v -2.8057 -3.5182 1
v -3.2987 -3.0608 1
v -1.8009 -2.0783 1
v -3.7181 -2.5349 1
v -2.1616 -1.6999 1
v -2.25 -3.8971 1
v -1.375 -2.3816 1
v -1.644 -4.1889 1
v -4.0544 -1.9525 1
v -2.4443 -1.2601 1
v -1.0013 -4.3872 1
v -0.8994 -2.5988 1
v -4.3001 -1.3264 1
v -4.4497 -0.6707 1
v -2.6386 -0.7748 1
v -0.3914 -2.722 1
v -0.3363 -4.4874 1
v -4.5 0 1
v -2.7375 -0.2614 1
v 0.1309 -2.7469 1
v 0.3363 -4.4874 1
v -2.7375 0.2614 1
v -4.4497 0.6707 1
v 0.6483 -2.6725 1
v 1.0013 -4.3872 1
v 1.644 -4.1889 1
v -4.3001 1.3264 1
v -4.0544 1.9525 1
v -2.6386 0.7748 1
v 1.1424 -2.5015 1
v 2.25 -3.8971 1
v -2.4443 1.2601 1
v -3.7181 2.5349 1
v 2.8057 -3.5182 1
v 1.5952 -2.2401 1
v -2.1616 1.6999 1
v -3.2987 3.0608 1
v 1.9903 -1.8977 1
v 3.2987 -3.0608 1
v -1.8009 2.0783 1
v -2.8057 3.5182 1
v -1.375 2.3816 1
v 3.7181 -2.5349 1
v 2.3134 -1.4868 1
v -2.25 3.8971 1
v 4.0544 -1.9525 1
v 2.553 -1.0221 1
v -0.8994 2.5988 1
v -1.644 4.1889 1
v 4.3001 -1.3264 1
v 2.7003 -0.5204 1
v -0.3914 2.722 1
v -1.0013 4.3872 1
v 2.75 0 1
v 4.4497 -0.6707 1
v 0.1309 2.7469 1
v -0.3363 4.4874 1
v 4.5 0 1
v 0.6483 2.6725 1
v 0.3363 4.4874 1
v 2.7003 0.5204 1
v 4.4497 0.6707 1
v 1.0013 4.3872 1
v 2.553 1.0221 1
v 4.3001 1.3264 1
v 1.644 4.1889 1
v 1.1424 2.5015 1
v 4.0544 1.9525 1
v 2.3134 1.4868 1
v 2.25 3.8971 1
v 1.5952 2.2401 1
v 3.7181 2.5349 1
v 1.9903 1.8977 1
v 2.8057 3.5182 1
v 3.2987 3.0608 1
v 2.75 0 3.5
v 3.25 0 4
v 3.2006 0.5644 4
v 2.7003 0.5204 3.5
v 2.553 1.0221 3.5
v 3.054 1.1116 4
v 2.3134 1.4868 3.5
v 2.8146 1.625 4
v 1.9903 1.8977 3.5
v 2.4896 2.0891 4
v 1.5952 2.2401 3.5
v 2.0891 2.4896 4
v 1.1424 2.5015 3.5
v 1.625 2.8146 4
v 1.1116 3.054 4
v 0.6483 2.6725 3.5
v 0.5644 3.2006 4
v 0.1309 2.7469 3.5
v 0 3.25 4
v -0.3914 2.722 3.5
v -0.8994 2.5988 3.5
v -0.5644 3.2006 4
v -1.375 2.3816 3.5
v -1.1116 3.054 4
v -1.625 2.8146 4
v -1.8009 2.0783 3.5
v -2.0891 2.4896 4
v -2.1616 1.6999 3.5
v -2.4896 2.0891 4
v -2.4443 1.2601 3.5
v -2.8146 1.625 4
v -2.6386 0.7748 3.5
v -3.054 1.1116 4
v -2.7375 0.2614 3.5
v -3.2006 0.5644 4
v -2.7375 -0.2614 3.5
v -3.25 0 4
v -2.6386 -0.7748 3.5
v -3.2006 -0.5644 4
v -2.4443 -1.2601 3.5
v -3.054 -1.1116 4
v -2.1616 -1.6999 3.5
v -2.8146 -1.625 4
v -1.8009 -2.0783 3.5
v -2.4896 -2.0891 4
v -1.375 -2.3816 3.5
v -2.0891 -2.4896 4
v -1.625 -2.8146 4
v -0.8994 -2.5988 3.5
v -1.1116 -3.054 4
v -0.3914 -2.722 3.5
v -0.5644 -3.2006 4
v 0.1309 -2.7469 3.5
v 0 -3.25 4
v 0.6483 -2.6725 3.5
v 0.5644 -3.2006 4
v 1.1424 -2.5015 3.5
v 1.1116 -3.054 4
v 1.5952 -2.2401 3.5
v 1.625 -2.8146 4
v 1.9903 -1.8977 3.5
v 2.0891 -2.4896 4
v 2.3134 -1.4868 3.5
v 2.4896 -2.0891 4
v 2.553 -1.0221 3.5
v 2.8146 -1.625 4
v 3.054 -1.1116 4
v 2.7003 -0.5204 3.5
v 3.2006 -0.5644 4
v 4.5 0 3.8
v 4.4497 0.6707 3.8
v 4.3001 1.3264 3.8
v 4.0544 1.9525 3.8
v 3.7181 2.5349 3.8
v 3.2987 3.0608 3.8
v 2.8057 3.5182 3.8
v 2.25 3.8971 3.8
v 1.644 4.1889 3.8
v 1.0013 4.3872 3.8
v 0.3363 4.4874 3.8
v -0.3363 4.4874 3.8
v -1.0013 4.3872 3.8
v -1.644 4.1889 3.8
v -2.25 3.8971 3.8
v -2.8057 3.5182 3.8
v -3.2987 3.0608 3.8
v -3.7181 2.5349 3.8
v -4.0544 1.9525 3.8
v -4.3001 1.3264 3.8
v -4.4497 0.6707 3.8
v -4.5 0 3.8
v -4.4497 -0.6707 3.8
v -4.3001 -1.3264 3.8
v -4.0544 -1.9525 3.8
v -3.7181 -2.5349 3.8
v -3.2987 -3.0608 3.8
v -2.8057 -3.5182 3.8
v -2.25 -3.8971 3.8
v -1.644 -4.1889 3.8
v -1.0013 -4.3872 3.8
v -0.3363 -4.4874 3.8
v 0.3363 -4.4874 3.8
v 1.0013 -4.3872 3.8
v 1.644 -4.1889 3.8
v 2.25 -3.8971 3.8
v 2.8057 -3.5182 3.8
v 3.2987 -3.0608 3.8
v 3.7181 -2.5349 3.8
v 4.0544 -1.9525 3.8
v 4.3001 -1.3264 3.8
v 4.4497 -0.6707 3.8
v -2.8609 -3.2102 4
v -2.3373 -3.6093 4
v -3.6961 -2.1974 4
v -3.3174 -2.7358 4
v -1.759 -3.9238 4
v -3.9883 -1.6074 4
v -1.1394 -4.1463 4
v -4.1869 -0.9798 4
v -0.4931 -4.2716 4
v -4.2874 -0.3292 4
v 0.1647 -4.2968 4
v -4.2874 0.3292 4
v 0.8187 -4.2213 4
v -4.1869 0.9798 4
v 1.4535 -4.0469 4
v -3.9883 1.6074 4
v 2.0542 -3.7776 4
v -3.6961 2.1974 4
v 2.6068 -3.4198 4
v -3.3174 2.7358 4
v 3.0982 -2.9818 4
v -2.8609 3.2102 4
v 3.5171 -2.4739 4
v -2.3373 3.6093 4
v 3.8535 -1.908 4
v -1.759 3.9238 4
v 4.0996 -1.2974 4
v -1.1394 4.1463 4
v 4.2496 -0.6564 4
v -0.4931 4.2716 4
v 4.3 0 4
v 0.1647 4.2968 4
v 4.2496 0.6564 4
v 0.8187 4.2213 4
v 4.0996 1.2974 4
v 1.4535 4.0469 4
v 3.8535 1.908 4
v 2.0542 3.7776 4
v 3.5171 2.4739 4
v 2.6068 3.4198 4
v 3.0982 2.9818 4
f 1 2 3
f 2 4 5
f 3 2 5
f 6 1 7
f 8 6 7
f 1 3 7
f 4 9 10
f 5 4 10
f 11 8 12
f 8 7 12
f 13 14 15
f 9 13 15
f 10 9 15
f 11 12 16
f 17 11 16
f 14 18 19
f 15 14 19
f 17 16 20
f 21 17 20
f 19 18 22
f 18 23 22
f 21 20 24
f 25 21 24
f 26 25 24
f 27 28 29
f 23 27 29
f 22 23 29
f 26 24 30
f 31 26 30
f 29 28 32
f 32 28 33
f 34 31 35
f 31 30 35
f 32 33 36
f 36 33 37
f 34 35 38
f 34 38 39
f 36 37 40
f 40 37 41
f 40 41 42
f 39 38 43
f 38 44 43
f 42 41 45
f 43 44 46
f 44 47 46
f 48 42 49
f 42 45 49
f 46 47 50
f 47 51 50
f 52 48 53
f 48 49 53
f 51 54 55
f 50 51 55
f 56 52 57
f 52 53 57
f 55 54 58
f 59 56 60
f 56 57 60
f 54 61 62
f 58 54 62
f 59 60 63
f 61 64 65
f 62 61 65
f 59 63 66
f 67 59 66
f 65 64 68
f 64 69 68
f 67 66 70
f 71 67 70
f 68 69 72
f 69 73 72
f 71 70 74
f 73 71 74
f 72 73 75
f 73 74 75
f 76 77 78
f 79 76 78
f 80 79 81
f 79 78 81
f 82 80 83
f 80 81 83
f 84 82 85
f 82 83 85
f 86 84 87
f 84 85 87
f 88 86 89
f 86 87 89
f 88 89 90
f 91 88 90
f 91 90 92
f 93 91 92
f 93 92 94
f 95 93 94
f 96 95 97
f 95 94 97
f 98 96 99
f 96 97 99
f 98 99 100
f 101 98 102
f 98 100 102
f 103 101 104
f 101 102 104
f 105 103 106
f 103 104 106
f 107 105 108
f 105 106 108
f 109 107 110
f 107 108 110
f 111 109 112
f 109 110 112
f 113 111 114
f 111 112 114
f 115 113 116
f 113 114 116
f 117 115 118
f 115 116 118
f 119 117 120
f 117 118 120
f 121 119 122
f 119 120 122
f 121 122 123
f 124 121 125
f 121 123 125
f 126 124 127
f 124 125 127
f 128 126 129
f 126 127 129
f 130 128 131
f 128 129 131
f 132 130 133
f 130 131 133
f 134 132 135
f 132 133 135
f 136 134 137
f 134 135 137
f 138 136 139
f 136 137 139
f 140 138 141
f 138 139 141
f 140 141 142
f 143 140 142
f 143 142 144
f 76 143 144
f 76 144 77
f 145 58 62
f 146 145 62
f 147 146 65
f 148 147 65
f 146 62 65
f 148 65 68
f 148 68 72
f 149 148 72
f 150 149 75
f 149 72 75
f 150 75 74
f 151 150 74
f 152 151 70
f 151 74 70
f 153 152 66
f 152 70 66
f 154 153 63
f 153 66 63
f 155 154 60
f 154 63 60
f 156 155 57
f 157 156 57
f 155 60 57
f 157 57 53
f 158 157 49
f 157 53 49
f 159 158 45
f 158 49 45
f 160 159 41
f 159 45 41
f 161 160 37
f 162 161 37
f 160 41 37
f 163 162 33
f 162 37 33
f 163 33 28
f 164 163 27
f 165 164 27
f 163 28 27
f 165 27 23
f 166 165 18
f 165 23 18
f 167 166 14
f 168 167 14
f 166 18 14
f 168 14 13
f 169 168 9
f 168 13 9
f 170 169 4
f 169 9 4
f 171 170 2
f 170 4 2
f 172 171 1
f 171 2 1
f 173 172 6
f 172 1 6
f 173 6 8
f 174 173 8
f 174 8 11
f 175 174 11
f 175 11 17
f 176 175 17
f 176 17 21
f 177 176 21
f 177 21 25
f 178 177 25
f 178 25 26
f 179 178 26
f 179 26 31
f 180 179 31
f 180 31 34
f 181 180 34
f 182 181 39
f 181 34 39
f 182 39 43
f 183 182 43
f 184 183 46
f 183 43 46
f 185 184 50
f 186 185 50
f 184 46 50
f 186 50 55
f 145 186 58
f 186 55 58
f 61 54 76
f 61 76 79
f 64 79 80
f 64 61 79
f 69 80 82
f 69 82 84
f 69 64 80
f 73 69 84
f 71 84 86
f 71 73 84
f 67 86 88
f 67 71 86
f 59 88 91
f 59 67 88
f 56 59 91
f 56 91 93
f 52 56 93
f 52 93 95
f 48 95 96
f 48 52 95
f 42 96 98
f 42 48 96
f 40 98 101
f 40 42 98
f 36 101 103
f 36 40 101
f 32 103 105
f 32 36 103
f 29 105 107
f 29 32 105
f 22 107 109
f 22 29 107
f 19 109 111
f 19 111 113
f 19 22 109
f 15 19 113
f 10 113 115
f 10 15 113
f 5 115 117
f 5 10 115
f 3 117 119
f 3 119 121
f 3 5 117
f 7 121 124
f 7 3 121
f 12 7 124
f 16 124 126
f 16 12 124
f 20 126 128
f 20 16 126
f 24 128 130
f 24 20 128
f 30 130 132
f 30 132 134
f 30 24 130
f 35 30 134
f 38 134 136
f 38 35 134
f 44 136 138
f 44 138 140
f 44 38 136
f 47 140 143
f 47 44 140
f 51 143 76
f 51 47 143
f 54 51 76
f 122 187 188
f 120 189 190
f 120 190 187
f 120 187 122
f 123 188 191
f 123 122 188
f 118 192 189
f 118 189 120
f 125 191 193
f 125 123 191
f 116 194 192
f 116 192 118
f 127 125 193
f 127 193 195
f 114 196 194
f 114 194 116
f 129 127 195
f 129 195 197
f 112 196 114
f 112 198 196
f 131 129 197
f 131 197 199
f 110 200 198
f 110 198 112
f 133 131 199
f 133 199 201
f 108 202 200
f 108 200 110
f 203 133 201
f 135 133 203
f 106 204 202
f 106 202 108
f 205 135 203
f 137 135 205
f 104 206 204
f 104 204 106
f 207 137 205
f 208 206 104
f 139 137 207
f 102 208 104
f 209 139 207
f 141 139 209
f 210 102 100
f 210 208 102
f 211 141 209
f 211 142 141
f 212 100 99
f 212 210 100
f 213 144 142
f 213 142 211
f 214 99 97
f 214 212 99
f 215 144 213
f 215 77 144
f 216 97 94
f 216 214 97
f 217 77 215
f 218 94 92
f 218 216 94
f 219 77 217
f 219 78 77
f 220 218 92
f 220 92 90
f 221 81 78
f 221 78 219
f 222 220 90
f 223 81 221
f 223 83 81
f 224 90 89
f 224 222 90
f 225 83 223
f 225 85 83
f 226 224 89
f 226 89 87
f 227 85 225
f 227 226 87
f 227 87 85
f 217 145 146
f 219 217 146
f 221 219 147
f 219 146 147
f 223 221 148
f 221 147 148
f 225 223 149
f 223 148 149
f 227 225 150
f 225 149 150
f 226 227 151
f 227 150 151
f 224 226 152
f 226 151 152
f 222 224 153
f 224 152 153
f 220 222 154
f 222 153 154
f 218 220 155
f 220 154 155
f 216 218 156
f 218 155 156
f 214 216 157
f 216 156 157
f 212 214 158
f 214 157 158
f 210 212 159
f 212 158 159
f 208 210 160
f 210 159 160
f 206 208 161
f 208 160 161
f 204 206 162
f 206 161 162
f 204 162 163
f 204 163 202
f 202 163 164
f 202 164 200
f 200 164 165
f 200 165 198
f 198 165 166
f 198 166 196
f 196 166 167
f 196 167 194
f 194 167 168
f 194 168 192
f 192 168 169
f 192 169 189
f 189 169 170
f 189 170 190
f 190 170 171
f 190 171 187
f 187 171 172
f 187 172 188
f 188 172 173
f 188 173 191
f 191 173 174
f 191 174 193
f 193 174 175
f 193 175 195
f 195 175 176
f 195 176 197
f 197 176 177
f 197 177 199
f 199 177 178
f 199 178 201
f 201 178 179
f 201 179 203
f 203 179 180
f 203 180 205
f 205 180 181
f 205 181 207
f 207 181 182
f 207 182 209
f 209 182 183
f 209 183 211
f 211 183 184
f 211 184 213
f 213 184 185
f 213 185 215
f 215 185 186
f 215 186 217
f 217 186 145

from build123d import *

# Parameters (mm, degrees)
SKETCH014_R     = 4.5
SKETCH014_R_2   = 2.75
PAD007_DEPTH    = 3
CHAMFER001_SIZE = 0.5
CHAMFER002_SIZE = 0.2


with BuildPart() as part:
    # Sketch014 → Pad007 (new body)
    with BuildSketch(Plane.XY):
        Circle(SKETCH014_R)
        Circle(SKETCH014_R_2, mode=Mode.SUBTRACT)
    extrude(amount=PAD007_DEPTH)

    # Chamfer001
    chamfer001_edges = [part.edges().sort_by_distance(p)[0] for p in [
        (-2.75, 0, 3),
    ]]
    chamfer(chamfer001_edges, length=CHAMFER001_SIZE)

    # Chamfer002
    chamfer002_edges = [part.edges().sort_by_distance(p)[0] for p in [
        (-4.5, 0, 3),
    ]]
    chamfer(chamfer002_edges, length=CHAMFER002_SIZE)


with BuildPart() as part_1:
    # Body003 placement: moved
    add(part.part.moved(Location((0, 0, 1))))


solid = part_1.part
